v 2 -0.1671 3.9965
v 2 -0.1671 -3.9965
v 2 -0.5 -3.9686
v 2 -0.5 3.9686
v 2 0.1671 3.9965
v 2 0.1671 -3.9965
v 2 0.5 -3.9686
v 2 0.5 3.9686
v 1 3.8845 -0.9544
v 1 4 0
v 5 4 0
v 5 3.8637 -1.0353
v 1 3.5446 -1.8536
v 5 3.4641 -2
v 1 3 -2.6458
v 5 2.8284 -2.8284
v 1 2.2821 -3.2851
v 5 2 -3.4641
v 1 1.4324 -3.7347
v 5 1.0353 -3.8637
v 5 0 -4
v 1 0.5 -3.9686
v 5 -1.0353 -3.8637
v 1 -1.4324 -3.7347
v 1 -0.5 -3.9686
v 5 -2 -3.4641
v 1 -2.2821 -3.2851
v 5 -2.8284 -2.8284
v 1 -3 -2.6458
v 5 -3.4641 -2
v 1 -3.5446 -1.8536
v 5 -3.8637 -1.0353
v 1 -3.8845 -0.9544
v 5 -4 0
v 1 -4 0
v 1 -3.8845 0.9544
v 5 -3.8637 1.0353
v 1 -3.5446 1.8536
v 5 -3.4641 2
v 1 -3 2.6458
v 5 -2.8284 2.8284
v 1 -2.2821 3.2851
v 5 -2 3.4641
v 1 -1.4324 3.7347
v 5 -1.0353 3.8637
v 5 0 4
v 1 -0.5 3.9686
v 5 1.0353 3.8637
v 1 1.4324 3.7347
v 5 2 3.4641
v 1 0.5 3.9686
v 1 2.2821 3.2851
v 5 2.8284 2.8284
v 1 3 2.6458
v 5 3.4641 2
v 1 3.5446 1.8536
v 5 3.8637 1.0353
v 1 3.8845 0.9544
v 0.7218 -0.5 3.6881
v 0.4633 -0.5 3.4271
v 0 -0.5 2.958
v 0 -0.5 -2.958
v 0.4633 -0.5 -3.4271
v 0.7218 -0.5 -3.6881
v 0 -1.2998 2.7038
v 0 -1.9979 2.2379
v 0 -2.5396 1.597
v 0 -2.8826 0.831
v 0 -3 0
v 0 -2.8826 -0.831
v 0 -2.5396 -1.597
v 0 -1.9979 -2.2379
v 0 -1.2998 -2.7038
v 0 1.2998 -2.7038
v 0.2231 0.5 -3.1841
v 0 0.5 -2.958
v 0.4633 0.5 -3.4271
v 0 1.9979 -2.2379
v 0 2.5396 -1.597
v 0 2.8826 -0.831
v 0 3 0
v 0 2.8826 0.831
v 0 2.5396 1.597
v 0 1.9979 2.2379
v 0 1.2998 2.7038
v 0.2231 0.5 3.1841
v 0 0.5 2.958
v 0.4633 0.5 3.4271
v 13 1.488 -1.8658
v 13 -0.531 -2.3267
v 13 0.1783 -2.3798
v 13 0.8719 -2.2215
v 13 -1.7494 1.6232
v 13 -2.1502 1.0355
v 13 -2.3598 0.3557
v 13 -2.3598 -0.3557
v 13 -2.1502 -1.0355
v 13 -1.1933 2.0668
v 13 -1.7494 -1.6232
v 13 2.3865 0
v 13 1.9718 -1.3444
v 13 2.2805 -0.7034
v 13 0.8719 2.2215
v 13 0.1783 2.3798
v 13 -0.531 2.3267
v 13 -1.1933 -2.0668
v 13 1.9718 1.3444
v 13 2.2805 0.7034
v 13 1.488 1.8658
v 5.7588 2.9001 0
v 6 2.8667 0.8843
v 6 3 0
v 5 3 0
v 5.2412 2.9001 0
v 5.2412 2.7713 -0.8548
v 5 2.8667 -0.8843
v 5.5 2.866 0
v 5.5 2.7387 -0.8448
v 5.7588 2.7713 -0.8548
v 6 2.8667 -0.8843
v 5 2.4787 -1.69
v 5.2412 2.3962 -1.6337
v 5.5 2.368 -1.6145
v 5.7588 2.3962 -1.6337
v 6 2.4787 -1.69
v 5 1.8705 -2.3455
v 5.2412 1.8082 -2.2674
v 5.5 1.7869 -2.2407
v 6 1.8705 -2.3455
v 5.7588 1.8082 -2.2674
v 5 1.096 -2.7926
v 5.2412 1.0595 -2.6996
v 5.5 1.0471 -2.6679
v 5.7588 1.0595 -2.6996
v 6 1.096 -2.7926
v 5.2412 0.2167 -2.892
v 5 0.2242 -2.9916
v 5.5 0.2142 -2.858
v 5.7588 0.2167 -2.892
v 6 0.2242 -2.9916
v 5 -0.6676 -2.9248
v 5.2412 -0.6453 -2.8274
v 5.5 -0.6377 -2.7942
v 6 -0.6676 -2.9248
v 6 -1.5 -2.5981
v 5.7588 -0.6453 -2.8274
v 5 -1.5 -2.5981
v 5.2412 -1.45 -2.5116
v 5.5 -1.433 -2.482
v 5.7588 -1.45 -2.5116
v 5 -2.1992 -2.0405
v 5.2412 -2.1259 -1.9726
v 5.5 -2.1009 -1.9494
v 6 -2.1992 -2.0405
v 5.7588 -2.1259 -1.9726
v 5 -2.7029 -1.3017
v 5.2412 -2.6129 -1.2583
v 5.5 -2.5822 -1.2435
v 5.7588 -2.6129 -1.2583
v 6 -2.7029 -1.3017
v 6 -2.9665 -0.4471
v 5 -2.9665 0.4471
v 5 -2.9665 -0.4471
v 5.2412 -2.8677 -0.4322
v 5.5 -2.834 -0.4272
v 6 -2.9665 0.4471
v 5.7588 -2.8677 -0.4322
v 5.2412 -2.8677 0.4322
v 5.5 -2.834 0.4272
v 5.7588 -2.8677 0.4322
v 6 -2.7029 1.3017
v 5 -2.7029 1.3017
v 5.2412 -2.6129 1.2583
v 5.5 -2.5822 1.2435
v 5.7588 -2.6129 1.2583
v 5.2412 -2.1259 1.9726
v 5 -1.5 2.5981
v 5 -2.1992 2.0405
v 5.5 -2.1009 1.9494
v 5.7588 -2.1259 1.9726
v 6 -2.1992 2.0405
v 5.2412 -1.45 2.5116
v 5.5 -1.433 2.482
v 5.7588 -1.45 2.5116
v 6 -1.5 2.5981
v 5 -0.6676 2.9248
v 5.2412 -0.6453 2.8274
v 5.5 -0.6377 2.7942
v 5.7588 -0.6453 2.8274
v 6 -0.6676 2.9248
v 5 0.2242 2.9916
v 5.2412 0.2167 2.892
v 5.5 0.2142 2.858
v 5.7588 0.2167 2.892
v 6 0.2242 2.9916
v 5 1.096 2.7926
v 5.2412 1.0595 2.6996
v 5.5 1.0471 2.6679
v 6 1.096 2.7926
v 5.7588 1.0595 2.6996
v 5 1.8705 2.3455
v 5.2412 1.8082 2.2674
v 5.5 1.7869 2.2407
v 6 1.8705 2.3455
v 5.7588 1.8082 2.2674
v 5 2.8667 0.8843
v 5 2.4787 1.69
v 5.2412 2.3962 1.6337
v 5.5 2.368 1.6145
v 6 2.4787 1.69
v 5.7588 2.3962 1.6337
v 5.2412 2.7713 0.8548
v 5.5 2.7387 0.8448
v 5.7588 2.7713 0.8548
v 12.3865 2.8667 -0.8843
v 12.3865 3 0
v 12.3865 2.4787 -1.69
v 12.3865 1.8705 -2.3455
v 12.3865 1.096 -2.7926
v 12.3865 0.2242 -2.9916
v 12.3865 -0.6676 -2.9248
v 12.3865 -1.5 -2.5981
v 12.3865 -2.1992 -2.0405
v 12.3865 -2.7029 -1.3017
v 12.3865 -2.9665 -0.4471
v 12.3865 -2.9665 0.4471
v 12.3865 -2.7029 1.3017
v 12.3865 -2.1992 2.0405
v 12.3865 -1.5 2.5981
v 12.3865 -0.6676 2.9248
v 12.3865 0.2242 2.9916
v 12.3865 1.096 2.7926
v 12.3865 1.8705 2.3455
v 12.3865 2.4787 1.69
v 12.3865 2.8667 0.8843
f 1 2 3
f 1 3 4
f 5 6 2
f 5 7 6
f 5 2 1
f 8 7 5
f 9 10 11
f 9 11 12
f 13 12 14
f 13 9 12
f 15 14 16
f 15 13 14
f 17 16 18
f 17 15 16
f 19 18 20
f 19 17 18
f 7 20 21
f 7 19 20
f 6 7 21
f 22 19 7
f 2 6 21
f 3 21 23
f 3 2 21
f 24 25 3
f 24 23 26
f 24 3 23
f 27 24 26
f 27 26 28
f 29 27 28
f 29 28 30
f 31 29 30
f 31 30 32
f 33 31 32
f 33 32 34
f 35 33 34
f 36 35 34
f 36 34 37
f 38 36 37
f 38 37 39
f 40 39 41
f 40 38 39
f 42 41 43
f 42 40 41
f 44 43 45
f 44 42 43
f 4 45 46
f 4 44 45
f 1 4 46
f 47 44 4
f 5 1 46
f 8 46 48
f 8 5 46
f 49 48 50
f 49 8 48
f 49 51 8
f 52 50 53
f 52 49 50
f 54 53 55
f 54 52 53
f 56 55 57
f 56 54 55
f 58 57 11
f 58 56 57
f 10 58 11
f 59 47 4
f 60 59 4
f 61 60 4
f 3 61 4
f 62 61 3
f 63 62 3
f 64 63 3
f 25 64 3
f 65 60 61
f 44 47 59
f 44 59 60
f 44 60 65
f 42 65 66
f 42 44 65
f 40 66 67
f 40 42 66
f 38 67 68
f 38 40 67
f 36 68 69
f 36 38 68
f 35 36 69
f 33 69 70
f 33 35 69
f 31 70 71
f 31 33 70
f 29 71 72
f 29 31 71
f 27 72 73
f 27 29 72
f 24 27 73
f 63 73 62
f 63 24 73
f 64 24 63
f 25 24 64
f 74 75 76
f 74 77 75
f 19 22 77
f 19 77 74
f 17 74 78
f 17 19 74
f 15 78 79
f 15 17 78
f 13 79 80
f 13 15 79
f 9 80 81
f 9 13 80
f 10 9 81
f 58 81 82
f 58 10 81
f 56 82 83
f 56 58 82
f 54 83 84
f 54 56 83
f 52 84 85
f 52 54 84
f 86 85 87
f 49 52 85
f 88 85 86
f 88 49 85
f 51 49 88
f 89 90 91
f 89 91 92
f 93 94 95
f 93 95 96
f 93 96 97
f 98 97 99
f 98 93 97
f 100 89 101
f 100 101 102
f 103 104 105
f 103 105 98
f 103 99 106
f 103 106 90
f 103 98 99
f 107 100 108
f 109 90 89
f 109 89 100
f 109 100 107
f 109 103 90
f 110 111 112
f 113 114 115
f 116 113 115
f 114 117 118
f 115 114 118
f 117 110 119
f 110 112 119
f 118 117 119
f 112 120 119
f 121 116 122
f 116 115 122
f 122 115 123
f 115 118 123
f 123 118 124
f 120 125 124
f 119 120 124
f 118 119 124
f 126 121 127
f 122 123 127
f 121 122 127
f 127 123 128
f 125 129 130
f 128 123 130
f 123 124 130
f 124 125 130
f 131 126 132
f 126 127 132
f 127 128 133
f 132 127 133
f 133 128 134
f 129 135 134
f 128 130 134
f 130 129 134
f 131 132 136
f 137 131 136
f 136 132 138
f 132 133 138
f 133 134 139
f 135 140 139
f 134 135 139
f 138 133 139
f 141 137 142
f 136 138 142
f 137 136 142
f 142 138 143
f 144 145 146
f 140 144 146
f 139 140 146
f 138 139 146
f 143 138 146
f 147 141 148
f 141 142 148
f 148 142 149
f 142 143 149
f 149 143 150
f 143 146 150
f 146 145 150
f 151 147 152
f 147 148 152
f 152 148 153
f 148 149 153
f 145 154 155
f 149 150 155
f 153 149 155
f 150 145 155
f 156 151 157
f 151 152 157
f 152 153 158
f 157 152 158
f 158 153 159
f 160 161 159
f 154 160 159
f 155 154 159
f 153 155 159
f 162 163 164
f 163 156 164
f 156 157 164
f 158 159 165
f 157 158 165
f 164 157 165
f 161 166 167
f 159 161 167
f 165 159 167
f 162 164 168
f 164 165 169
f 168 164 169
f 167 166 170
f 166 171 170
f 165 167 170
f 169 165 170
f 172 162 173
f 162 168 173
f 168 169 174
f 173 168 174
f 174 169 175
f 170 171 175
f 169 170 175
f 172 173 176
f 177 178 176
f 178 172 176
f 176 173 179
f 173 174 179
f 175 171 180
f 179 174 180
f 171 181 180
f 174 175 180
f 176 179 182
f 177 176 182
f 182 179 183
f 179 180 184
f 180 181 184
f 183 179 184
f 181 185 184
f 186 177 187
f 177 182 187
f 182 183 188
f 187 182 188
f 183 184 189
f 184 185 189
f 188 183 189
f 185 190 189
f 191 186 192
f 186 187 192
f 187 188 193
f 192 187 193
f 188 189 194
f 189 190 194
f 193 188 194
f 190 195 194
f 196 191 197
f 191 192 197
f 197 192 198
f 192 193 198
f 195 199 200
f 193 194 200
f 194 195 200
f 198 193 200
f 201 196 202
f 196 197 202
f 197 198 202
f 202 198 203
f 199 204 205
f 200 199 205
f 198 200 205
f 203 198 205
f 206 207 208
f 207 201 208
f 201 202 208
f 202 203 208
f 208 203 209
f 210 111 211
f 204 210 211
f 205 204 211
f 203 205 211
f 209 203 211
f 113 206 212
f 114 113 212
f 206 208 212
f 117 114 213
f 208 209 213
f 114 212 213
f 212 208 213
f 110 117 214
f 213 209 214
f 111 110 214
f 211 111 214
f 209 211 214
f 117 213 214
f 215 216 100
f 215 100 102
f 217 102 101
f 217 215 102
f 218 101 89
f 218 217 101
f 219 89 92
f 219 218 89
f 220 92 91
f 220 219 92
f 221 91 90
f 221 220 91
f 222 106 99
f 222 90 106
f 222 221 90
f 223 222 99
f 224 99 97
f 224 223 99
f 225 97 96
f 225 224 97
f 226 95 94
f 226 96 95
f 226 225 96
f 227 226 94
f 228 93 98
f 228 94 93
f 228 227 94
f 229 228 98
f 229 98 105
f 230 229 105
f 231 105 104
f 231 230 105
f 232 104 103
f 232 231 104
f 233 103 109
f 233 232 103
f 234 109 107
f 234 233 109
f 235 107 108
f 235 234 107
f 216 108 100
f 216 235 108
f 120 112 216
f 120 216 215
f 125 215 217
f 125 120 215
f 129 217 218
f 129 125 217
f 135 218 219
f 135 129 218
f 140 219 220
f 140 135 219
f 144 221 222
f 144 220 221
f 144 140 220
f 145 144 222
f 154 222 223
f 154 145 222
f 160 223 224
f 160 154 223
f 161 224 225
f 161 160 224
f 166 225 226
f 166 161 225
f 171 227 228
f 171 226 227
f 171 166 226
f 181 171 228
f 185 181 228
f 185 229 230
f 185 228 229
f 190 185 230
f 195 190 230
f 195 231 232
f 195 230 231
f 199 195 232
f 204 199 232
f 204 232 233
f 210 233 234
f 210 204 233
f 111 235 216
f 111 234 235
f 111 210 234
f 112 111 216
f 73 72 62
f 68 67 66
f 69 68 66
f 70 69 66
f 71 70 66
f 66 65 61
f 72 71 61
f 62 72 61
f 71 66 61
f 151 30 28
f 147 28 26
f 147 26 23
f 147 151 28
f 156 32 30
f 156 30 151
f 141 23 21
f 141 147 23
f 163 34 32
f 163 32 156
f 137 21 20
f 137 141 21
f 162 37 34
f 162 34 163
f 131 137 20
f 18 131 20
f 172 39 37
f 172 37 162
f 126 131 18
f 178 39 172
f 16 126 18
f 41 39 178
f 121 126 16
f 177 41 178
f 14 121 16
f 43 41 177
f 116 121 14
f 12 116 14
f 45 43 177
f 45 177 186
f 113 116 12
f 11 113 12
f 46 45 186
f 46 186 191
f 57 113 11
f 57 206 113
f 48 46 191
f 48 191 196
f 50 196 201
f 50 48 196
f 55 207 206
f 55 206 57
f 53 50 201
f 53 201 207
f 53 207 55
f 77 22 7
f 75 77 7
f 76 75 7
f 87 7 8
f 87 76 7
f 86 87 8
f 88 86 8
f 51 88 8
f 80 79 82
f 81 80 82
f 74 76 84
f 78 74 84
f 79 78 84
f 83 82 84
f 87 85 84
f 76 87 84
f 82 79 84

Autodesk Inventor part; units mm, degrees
ref_plane "YZ Plane" through (0, 0, 0) normal (1, 0, 0) x (0, 1, 0)
ref_plane "XZ Plane" through (0, 0, 0) normal (0, 1, 0) x (-1, 0, 0)
sketch "Sketch1" plane through (0, 0, 0) normal (0, 0, 1) x (1, 0, 0)
  line L0 (0, 0) -> (13, 0)
  line L1 (13, 0) -> (13, 3)
  line L2 (13, 3) -> (5, 3)
  line L3 (5, 3) -> (5, 4)
  line L4 (5, 4) -> (0, 4)
  line L5 (0, 4) -> (0, 0)
  line L6 (-2.6, 0) -> (15.6, 0) projected
  line L7 (0, -0.8) -> (0, 4.8) projected
  arc A0 (5, 3) -> (6, 3) centre (5.5, 3.866) ccw
  dimension "d0" = 5
  dimension "d1" = 8
  dimension "d2" = 6
  dimension "d3" = 8
  dimension "d14" = 1
  dimension "d15" = 1
revolve "Body" add sketch "Sketch1" angle 360 about axis through (0, 0, 0) along (1, 0, 0)
sketch "Sketch2" plane through (0, 0, 0) normal (-1, 0, 0) x (0, 0, 1)
  circle A0 centre (0, 0) radius 4 projected
  line L0 (0, -5.6) -> (0, 5.6) projected
  line L1 (-5.6, 0) -> (5.6, 0) projected
  line L2 (-4, 0.5) -> (4, 0.5)
  line L3 (4, 0.5) -> (4, -0.5)
  line L4 (4, -0.5) -> (-4, -0.5)
  line L5 (-4, -0.5) -> (-4, 0.5)
  line L6 (-4, 0) -> (4, 0) construction
  line L7 (0, 0.5) -> (0, -0.5) construction
  dimension "d5" = 1
extrude "Slot" cut sketch "Sketch2" against normal blind 2 contours L1 L0 L2 A0 | L3 L4 A0 | A0 L4 L0 L1 | A0 L2 L3 | L1 A0 L2 L0 | L0 L4 A0 L1 | L5 L2 A0 | A0 L4 L5
chamfer "Chamfer1" distance 1 angle 45 3 edges at (0, 3, -2.6458) (0, 3, 2.6458) (0, -4, 0) measured on face at (3.3333, -1.7193, 3.6117)
thread "Thread" size "M6x1" class "6g" standard "ISO Metric profile" length 8
chamfer "Chamfer2" distance 0.6135 distance2 0.6135 1 edges at (13, -3, 0) measured on face at (13, 0.7776, -0.4238)
revolve "Groove1" cut sketch "Sketch1" angle 360 about axis through (0, 0, 0) along (1, 0, 0) contours A0 L2
ref_plane "Work Plane1" through (8, 0, 0) normal (0, 0, -1) x (1, 0, 0)
equation "\"d0\" = KOH"
equation "\"d1\" = GEL"
equation "\"d2\" = NND"
equation "\"d3\" = KOD"
equation "\"d14\" = SBR"
equation "\"d15\" = SBR"
equation "\"d5\" = SBR"
equation "\"d6\" = STI"
equation "\"d8\" = PHH"
equation "\"d19\" = PHH"
equation "\"d10\" = GEL"
equation "\"d12\" = -0.5 * GD1 + 0.5 * NND"
equation "\"d13\" = GUL"
equation "\"NND\" = 6"
equation "\"GEL\" = 8"
equation "\"KOD\" = 8"
equation "\"KOH\" = 5"
equation "\"SBR\" = 1"
equation "\"GUL\" = 0.61345 * PTC"
equation "\"PHH\" = 1"
equation "\"GD1\" = THREADDIA - 1.2269 * PTC"
equation "\"STI\" = 2"
equation "\"THREADDIA\" = 6"
equation "\"TOA\" = 30deg"
equation "\"NLG\" = GEL"
equation "\"PTC\" = 1"
equation "\"GAL\" = 0.61345 * PTC"
properties part number "DIN 927 - M6 x 5-14H" material "Steel, Mild"
